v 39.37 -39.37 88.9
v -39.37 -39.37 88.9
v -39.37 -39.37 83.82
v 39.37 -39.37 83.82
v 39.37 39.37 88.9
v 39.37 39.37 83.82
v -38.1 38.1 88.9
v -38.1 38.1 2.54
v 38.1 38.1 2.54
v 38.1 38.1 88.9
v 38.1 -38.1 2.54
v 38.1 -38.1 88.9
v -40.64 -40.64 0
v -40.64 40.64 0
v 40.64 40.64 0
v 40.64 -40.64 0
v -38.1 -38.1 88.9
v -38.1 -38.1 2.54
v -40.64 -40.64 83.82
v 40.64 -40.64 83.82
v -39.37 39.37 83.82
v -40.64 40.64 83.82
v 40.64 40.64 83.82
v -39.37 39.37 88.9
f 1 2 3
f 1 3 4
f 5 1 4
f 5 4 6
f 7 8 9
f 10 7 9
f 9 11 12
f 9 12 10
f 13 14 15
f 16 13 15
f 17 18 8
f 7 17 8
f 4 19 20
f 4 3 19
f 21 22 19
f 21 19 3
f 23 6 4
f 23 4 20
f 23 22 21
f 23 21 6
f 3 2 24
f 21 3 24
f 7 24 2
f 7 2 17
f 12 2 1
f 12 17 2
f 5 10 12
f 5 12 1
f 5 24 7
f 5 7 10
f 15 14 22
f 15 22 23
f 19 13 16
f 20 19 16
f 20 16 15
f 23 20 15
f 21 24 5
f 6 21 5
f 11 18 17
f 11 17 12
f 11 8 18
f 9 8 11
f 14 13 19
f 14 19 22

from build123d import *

# Parameters (mm, degrees)
SKETCH1_W           = 81.28
SKETCH1_H           = 81.28
BOSS_EXTRUDE1_DEPTH = 88.9
SHELL1_T            = -2.54
SKETCH2_W           = 91.781641856
SKETCH2_H           = 86.951733082
SKETCH2_W_2         = 78.74
SKETCH2_H_2         = 78.74
CUT_EXTRUDE1_DEPTH  = 5.08


with BuildPart() as part:
    # Sketch1 → Boss-Extrude1 (new body)
    with BuildSketch(Plane.XY):
        Rectangle(SKETCH1_W, SKETCH1_H)
    extrude(amount=BOSS_EXTRUDE1_DEPTH)

    # Shell1
    shell1_openings = [part.faces().sort_by_distance(p)[0] for p in [
        (0, 0, 88.9),
    ]]
    offset(amount=SHELL1_T, openings=shell1_openings, kind=Kind.INTERSECTION)

    # Sketch2 → Cut-Extrude1 (cut)
    with BuildSketch(Plane.XY.offset(88.9)):
        Rectangle(SKETCH2_W, SKETCH2_H)
        Rectangle(SKETCH2_W_2, SKETCH2_H_2, mode=Mode.SUBTRACT)
    extrude(amount=-CUT_EXTRUDE1_DEPTH, mode=Mode.SUBTRACT)


solid = part.part
